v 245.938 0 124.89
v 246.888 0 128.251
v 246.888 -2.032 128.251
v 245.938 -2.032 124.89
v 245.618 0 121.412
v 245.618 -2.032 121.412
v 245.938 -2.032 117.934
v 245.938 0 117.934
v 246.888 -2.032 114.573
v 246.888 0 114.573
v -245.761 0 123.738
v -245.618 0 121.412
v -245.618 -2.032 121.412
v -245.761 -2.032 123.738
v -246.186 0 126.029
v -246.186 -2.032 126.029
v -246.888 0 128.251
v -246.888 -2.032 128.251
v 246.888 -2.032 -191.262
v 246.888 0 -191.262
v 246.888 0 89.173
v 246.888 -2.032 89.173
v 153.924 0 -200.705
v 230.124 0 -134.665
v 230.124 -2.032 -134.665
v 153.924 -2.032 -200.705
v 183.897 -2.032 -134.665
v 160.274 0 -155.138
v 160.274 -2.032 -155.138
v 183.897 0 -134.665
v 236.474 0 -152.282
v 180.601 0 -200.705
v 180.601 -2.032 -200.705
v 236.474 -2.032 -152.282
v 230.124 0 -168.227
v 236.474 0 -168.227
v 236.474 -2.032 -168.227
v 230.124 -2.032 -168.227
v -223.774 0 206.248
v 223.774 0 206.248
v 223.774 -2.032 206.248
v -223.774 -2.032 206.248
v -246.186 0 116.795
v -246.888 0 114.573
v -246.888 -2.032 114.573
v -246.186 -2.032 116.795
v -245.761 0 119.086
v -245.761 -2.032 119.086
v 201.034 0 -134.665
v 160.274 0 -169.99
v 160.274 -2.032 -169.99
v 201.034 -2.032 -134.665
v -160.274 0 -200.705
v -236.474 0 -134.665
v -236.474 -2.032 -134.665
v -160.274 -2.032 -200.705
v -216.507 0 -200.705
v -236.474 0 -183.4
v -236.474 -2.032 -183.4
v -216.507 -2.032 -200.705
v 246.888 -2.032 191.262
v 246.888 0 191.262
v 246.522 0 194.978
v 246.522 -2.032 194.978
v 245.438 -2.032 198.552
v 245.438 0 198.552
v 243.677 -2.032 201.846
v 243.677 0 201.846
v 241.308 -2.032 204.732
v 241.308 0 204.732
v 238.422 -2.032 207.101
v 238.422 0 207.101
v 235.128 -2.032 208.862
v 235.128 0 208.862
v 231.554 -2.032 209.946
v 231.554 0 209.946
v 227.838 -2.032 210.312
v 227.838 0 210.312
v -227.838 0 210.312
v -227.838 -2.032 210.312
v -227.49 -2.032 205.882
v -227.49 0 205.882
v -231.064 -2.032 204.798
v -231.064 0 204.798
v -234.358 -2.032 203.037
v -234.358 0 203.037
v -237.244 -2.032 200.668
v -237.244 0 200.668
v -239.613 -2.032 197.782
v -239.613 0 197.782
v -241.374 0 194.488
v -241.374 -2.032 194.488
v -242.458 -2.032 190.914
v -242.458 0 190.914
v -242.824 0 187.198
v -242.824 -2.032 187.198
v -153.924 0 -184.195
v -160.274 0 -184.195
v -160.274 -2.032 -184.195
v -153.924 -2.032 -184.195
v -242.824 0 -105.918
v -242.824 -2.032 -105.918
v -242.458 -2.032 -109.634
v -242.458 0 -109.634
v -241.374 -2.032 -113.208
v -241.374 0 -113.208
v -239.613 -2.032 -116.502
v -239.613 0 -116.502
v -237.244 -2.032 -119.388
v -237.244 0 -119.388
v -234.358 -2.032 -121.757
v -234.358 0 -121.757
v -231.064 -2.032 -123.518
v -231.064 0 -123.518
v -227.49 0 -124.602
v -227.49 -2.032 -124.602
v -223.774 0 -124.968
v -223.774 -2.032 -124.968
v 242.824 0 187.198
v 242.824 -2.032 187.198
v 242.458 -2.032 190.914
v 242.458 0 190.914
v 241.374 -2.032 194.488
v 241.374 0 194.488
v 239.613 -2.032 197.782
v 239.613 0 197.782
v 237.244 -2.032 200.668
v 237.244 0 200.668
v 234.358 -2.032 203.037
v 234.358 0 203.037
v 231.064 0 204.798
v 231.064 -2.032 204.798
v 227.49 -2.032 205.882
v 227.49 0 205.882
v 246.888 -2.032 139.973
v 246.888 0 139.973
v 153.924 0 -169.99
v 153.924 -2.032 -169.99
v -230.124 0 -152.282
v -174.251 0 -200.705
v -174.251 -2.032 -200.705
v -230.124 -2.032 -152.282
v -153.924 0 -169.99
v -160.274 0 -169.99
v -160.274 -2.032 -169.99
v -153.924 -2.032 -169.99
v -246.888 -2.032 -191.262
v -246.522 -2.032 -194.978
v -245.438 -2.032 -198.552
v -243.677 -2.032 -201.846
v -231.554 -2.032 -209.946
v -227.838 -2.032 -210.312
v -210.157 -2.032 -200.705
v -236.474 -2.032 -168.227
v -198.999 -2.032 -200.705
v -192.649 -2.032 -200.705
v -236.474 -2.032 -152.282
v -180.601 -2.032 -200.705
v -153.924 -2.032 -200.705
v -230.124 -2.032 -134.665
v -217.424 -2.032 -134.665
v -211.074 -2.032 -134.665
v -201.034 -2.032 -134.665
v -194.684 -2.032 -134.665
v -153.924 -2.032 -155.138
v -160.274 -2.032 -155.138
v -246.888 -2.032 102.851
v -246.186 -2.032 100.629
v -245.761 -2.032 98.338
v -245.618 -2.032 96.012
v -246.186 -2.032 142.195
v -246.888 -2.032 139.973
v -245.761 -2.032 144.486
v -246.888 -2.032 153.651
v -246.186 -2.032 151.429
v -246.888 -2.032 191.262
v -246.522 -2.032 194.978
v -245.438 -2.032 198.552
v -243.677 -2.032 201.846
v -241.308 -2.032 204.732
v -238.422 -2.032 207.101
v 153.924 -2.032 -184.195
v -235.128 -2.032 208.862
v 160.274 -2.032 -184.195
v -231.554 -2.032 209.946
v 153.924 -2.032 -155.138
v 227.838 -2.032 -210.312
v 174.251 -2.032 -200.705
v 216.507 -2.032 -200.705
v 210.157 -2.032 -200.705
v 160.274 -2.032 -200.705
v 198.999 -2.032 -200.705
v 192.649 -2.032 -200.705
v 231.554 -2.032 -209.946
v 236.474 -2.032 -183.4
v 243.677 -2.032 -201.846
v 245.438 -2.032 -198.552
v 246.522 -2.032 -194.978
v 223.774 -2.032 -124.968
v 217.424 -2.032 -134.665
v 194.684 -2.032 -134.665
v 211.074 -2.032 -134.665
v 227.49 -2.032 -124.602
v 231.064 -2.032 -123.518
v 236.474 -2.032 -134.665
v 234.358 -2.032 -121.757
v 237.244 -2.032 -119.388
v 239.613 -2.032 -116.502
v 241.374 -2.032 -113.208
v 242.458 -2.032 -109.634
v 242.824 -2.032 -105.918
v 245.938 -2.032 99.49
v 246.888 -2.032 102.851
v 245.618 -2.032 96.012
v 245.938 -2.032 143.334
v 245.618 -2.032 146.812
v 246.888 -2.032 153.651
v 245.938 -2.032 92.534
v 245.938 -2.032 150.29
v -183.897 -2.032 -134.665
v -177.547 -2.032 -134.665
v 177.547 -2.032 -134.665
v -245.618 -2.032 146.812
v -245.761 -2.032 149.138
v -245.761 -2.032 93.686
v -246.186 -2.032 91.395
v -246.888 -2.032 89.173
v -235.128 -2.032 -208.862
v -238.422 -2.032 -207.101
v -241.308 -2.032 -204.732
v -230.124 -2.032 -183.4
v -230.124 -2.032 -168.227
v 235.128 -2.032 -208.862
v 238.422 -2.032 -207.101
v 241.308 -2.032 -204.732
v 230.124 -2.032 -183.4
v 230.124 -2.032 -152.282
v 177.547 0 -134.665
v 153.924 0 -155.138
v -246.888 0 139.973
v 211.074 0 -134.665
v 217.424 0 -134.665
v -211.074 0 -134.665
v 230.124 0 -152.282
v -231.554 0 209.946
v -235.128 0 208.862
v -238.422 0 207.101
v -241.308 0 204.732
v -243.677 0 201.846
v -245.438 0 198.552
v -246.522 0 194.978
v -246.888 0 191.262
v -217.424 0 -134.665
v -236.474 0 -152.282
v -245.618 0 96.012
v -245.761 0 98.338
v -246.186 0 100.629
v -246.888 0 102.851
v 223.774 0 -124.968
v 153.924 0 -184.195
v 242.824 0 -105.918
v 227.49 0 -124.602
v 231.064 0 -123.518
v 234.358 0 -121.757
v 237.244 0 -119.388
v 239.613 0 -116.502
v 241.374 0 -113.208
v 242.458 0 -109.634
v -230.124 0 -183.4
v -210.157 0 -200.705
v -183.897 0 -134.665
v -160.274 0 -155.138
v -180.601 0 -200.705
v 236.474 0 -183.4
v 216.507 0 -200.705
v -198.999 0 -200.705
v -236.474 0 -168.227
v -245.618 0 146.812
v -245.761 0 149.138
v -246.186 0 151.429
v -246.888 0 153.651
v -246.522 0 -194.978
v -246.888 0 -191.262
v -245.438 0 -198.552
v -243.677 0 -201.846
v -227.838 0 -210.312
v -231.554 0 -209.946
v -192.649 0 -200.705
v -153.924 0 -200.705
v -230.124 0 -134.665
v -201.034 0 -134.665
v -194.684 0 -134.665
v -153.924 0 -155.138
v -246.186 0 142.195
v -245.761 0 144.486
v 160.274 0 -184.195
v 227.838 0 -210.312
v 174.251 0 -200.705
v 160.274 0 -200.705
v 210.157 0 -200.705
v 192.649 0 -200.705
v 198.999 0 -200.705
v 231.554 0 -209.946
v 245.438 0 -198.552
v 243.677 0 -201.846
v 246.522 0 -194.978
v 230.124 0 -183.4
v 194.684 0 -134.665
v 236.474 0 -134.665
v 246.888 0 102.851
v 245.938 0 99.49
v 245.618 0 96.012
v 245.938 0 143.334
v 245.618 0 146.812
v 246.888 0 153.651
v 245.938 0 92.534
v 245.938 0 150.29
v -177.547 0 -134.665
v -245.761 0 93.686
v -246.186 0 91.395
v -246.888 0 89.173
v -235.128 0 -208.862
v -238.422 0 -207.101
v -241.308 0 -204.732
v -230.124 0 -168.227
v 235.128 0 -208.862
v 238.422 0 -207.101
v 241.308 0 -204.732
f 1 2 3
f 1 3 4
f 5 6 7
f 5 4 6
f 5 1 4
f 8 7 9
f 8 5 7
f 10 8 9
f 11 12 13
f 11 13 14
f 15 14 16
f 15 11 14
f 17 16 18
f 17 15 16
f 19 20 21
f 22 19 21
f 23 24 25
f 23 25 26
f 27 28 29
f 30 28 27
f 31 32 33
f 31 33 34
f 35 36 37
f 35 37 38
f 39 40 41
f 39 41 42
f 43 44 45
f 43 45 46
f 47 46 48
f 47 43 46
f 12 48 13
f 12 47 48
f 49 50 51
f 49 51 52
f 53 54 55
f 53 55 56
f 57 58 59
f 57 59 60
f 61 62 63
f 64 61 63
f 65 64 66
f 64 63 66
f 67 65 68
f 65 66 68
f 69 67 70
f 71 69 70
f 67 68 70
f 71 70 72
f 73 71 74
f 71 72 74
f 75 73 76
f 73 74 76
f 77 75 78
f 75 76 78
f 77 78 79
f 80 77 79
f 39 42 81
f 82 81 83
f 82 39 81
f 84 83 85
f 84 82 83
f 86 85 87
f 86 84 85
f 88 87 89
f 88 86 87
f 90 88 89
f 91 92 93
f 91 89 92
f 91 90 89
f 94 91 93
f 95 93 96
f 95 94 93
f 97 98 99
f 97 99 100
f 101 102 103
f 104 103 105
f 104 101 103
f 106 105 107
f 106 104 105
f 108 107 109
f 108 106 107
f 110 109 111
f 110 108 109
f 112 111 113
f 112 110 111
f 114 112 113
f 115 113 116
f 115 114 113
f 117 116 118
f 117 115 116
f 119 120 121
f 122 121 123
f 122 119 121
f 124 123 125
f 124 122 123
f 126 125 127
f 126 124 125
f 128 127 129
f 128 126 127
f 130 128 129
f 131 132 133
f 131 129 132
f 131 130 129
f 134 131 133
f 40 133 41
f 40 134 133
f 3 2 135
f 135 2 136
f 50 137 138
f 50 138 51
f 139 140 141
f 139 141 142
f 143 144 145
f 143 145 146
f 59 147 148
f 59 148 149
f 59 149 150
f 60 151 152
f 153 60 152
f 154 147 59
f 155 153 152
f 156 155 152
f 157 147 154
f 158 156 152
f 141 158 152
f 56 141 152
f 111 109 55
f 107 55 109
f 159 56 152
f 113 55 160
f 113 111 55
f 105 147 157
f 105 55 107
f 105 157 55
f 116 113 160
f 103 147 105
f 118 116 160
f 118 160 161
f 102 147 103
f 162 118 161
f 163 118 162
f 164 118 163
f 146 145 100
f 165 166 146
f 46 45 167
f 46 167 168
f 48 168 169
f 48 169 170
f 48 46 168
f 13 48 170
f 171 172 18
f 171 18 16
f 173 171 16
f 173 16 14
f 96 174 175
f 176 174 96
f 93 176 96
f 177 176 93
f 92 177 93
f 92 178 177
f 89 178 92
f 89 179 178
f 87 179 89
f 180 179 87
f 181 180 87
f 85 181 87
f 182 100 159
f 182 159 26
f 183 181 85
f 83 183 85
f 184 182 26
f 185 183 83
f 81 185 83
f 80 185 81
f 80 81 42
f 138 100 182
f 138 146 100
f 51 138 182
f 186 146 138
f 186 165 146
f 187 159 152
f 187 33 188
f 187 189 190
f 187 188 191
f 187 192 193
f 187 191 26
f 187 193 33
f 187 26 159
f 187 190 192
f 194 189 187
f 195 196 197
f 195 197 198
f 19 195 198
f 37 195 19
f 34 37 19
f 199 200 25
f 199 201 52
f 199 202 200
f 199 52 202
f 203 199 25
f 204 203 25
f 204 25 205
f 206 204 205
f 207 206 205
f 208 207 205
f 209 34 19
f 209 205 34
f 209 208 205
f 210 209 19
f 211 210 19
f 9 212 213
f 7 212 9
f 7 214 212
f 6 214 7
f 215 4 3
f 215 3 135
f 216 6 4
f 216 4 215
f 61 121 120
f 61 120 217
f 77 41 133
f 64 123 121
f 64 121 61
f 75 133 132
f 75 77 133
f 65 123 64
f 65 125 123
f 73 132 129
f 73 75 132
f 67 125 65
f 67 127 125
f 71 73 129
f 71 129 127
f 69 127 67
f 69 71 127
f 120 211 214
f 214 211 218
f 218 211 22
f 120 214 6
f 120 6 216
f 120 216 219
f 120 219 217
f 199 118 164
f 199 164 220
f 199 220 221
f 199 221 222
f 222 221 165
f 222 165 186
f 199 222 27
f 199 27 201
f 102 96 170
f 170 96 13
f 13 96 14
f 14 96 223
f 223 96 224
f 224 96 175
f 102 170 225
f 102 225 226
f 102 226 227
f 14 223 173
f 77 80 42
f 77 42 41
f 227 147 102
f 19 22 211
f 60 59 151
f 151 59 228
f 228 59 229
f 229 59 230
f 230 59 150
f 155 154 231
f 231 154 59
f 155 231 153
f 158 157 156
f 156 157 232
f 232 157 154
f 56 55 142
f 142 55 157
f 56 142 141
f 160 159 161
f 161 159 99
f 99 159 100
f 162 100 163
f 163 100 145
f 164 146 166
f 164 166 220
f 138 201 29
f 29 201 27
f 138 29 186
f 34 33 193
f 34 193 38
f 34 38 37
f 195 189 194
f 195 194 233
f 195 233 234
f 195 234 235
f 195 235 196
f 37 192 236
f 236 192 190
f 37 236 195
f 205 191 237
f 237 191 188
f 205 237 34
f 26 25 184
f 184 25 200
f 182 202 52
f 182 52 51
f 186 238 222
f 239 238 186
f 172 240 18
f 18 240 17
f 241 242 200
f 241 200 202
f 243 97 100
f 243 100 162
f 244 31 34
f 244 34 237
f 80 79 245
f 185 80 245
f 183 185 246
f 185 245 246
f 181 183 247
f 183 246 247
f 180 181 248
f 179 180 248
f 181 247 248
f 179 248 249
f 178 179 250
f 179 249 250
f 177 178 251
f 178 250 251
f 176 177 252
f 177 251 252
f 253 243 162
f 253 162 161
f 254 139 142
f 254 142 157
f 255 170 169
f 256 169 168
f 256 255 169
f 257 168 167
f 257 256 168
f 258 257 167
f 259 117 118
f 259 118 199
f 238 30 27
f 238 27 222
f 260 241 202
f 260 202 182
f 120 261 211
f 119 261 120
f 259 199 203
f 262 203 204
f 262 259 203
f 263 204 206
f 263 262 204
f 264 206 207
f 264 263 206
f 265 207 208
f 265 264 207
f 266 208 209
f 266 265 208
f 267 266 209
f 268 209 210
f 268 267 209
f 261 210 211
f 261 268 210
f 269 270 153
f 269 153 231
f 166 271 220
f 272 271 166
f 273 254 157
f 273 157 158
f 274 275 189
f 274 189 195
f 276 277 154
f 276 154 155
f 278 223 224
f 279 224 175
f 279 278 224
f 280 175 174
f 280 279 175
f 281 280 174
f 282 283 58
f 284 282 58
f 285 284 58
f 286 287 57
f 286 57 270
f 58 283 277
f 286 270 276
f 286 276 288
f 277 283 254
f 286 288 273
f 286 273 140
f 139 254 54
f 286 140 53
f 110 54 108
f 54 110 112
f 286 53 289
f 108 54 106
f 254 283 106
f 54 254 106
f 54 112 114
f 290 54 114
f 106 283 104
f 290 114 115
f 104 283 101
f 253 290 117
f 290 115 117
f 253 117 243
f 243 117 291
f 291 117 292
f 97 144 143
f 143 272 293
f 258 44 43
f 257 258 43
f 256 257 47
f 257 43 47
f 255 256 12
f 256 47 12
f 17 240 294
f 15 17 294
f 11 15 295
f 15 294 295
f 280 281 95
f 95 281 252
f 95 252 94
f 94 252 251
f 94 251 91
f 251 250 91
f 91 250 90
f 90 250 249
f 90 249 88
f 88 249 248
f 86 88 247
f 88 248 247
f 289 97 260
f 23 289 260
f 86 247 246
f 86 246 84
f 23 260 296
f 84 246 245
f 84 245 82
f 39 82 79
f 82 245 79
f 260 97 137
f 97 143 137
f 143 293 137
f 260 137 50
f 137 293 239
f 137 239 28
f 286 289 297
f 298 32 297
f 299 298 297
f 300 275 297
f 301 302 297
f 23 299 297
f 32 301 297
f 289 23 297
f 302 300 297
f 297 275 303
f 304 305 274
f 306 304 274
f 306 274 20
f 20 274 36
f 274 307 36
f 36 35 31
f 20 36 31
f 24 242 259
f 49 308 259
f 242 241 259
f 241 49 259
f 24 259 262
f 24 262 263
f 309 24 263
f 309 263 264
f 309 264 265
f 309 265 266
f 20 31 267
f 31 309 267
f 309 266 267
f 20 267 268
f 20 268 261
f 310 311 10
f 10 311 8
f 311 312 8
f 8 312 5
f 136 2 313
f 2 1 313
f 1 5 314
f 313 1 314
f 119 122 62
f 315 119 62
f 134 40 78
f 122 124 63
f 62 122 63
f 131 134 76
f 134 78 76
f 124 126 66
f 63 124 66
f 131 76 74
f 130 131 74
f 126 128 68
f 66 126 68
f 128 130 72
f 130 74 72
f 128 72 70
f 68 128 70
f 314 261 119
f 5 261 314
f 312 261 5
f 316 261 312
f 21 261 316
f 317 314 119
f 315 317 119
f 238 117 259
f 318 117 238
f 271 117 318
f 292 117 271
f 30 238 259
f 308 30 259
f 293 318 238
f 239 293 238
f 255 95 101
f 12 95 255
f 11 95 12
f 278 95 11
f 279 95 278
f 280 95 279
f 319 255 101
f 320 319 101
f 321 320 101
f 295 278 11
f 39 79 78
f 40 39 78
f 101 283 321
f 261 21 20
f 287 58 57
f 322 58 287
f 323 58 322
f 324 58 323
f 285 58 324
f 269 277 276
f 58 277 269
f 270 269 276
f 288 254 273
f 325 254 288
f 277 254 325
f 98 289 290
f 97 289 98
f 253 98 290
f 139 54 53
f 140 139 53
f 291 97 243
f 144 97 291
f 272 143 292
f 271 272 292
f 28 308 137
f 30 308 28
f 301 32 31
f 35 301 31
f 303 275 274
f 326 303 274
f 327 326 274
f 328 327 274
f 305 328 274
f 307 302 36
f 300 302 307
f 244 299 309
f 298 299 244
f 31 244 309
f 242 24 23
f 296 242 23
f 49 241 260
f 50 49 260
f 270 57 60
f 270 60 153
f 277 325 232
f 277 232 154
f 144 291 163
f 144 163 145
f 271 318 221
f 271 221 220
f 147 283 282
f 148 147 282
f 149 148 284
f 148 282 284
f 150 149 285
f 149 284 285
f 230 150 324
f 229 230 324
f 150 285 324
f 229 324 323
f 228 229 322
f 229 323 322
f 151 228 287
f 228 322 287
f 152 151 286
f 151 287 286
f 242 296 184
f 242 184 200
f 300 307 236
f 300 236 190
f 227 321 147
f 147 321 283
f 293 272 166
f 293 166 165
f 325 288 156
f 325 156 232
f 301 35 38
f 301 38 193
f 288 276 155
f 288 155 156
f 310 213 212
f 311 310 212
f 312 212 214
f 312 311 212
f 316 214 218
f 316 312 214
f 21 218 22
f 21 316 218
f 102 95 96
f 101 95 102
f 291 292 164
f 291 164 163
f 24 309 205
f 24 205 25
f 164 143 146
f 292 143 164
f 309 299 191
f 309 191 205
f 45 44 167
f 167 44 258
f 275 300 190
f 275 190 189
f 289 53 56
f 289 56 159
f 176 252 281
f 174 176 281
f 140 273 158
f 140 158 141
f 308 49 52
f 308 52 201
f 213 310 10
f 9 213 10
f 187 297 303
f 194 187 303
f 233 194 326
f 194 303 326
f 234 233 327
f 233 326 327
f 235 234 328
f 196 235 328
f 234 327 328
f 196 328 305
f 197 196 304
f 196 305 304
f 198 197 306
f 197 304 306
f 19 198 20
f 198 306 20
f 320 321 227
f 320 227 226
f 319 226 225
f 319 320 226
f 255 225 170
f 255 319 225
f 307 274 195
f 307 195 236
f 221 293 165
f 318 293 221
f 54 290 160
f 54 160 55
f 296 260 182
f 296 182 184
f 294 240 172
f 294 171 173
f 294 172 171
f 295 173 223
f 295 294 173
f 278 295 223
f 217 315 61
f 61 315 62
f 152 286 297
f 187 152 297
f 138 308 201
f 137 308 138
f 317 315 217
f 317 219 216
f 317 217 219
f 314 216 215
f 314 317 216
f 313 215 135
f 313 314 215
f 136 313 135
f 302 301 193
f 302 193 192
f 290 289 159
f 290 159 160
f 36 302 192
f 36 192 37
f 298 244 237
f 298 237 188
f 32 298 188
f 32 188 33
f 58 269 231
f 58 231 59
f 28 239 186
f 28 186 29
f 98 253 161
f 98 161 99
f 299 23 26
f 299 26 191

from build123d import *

# Parameters (mm, degrees)
F2_DEPTH = 2.032
F3_DEPTH = 2.54
F5_DEPTH = 25.4
F7_DEPTH = 25.4


with BuildPart() as f2:
    # F0 (on Front) → F2 (new body)
    with BuildSketch(Plane.XZ):
        with BuildLine():
            ThreePointArc((246.888, 191.262), (241.308384, 204.732384), (227.838, 210.312))
            Line((227.838, 210.312), (-227.838, 210.312))
            ThreePointArc((-227.838, 210.312), (-241.308384, 204.732384), (-246.888, 191.262))
            Line((-246.888, 191.262), (-246.888, -191.262))
            ThreePointArc((-246.888, -191.262), (-241.308384, -204.732384), (-227.838, -210.312))
            Line((-227.838, -210.312), (227.838, -210.312))
            ThreePointArc((227.838, -210.312), (241.308384, -204.732384), (246.888, -191.262))
            Line((246.888, -191.262), (246.888, 191.262))
        make_face()
    extrude(amount=F2_DEPTH)

    # F1 (on Front) → F3 (cut)
    with BuildSketch(Plane.XZ):
        with BuildLine():
            Line((223.774, 206.248), (-223.774, 206.248))
            ThreePointArc((-223.774, 206.248), (-237.244384, 200.668384), (-242.824, 187.198))
            Line((-242.824, 187.198), (-242.824, -105.918))
            ThreePointArc((-242.824, -105.918), (-237.244384, -119.388384), (-223.774, -124.968))
            Line((-223.774, -124.968), (223.774, -124.968))
            ThreePointArc((223.774, -124.968), (237.244384, -119.388384), (242.824, -105.918))
            Line((242.824, -105.918), (242.824, 187.198))
            ThreePointArc((242.824, 187.198), (237.244384, 200.668384), (223.774, 206.248))
        make_face()
    extrude(amount=F3_DEPTH, mode=Mode.SUBTRACT)

    # F4 (on Front) → F5 (cut)
    with BuildSketch(Plane.XZ):
        Polygon((-230.124, -134.664931), (-236.474, -134.664931), (-160.274, -200.704931), (-153.924, -200.704931), align=None)
        Polygon((-211.074, -134.664931), (-217.424, -134.664931), (-160.274, -184.194931), (-153.924, -184.194931), align=None)
        Polygon((-230.124, -152.281931), (-236.474, -152.281931), (-180.601308, -200.704931), (-174.251308, -200.704931), align=None)
        Polygon((-230.124, -168.226628), (-236.474, -168.226628), (-198.999035, -200.704931), (-192.649035, -200.704931), align=None)
        Polygon((-230.124, -183.399803), (-236.474, -183.399803), (-216.506545, -200.704931), (-210.156545, -200.704931), align=None)
        Polygon((-160.274, -169.990187), (-153.924, -169.990187), (-194.683911, -134.664931), (-201.033911, -134.664931), align=None)
        Polygon((-160.274, -155.138477), (-153.924, -155.138477), (-177.547322, -134.664931), (-183.897322, -134.664931), align=None)
        Polygon((160.274, -184.194931), (217.424, -134.664931), (211.074, -134.664931), (153.924, -184.194931), align=None)
        Polygon((160.274, -200.704931), (236.474, -134.664931), (230.124, -134.664931), (153.924, -200.704931), align=None)
        Polygon((160.274, -169.990187), (201.033911, -134.664931), (194.683911, -134.664931), (153.924, -169.990187), align=None)
        Polygon((177.547322, -134.664931), (153.924, -155.138477), (160.274, -155.138477), (183.897322, -134.664931), align=None)
        Polygon((198.999035, -200.704931), (236.474, -168.226628), (230.124, -168.226628), (192.649035, -200.704931), align=None)
        Polygon((230.124, -152.281931), (174.251308, -200.704931), (180.601308, -200.704931), (236.474, -152.281931), align=None)
        Polygon((230.124, -183.399803), (210.156545, -200.704931), (216.506545, -200.704931), (236.474, -183.399803), align=None)
    extrude(amount=F5_DEPTH, mode=Mode.SUBTRACT)

    # F6 (on Front) → F7 (cut)
    with BuildSketch(Plane.XZ):
        with BuildLine():
            ThreePointArc((278.867032, 134.112), (282.463983, 140.014539), (283.718, 146.812))
            ThreePointArc((283.718, 146.812), (257.870539, 164.607983), (250.468968, 134.112))
            ThreePointArc((250.468968, 134.112), (264.668, 140.462), (278.867032, 134.112))
        make_face()
        with BuildLine():
            ThreePointArc((278.867032, 134.112), (264.668, 127.762), (250.468968, 134.112))
            ThreePointArc((250.468968, 134.112), (245.618, 121.412), (250.468968, 108.712))
            ThreePointArc((250.468968, 108.712), (264.668, 115.062), (278.867032, 108.712))
            ThreePointArc((278.867032, 108.712), (282.463983, 114.614539), (283.718, 121.412))
            ThreePointArc((283.718, 121.412), (282.463983, 128.209461), (278.867032, 134.112))
        make_face()
        with BuildLine():
            ThreePointArc((278.867032, 108.712), (264.668, 102.362), (250.468968, 108.712))
            ThreePointArc((250.468968, 108.712), (257.870539, 78.216017), (283.718, 96.012))
            ThreePointArc((283.718, 96.012), (282.463983, 102.809461), (278.867032, 108.712))
        make_face()
        with BuildLine():
            ThreePointArc((-250.468968, 134.112), (-246.872017, 140.014539), (-245.618, 146.812))
            ThreePointArc((-245.618, 146.812), (-271.465461, 164.607983), (-278.867032, 134.112))
            ThreePointArc((-278.867032, 134.112), (-264.668, 140.462), (-250.468968, 134.112))
        make_face()
        with BuildLine():
            ThreePointArc((-250.468968, 134.112), (-264.668, 127.762), (-278.867032, 134.112))
            ThreePointArc((-278.867032, 134.112), (-283.718, 121.412), (-278.867032, 108.712))
            ThreePointArc((-278.867032, 108.712), (-264.668, 115.062), (-250.468968, 108.712))
            ThreePointArc((-250.468968, 108.712), (-246.872017, 114.614539), (-245.618, 121.412))
            ThreePointArc((-245.618, 121.412), (-246.872017, 128.209461), (-250.468968, 134.112))
        make_face()
        with BuildLine():
            ThreePointArc((-250.468968, 108.712), (-264.668, 102.362), (-278.867032, 108.712))
            ThreePointArc((-278.867032, 108.712), (-271.465461, 78.216017), (-245.618, 96.012))
            ThreePointArc((-245.618, 96.012), (-246.872017, 102.809461), (-250.468968, 108.712))
        make_face()
    extrude(amount=F7_DEPTH, mode=Mode.SUBTRACT)


solid = f2.part
